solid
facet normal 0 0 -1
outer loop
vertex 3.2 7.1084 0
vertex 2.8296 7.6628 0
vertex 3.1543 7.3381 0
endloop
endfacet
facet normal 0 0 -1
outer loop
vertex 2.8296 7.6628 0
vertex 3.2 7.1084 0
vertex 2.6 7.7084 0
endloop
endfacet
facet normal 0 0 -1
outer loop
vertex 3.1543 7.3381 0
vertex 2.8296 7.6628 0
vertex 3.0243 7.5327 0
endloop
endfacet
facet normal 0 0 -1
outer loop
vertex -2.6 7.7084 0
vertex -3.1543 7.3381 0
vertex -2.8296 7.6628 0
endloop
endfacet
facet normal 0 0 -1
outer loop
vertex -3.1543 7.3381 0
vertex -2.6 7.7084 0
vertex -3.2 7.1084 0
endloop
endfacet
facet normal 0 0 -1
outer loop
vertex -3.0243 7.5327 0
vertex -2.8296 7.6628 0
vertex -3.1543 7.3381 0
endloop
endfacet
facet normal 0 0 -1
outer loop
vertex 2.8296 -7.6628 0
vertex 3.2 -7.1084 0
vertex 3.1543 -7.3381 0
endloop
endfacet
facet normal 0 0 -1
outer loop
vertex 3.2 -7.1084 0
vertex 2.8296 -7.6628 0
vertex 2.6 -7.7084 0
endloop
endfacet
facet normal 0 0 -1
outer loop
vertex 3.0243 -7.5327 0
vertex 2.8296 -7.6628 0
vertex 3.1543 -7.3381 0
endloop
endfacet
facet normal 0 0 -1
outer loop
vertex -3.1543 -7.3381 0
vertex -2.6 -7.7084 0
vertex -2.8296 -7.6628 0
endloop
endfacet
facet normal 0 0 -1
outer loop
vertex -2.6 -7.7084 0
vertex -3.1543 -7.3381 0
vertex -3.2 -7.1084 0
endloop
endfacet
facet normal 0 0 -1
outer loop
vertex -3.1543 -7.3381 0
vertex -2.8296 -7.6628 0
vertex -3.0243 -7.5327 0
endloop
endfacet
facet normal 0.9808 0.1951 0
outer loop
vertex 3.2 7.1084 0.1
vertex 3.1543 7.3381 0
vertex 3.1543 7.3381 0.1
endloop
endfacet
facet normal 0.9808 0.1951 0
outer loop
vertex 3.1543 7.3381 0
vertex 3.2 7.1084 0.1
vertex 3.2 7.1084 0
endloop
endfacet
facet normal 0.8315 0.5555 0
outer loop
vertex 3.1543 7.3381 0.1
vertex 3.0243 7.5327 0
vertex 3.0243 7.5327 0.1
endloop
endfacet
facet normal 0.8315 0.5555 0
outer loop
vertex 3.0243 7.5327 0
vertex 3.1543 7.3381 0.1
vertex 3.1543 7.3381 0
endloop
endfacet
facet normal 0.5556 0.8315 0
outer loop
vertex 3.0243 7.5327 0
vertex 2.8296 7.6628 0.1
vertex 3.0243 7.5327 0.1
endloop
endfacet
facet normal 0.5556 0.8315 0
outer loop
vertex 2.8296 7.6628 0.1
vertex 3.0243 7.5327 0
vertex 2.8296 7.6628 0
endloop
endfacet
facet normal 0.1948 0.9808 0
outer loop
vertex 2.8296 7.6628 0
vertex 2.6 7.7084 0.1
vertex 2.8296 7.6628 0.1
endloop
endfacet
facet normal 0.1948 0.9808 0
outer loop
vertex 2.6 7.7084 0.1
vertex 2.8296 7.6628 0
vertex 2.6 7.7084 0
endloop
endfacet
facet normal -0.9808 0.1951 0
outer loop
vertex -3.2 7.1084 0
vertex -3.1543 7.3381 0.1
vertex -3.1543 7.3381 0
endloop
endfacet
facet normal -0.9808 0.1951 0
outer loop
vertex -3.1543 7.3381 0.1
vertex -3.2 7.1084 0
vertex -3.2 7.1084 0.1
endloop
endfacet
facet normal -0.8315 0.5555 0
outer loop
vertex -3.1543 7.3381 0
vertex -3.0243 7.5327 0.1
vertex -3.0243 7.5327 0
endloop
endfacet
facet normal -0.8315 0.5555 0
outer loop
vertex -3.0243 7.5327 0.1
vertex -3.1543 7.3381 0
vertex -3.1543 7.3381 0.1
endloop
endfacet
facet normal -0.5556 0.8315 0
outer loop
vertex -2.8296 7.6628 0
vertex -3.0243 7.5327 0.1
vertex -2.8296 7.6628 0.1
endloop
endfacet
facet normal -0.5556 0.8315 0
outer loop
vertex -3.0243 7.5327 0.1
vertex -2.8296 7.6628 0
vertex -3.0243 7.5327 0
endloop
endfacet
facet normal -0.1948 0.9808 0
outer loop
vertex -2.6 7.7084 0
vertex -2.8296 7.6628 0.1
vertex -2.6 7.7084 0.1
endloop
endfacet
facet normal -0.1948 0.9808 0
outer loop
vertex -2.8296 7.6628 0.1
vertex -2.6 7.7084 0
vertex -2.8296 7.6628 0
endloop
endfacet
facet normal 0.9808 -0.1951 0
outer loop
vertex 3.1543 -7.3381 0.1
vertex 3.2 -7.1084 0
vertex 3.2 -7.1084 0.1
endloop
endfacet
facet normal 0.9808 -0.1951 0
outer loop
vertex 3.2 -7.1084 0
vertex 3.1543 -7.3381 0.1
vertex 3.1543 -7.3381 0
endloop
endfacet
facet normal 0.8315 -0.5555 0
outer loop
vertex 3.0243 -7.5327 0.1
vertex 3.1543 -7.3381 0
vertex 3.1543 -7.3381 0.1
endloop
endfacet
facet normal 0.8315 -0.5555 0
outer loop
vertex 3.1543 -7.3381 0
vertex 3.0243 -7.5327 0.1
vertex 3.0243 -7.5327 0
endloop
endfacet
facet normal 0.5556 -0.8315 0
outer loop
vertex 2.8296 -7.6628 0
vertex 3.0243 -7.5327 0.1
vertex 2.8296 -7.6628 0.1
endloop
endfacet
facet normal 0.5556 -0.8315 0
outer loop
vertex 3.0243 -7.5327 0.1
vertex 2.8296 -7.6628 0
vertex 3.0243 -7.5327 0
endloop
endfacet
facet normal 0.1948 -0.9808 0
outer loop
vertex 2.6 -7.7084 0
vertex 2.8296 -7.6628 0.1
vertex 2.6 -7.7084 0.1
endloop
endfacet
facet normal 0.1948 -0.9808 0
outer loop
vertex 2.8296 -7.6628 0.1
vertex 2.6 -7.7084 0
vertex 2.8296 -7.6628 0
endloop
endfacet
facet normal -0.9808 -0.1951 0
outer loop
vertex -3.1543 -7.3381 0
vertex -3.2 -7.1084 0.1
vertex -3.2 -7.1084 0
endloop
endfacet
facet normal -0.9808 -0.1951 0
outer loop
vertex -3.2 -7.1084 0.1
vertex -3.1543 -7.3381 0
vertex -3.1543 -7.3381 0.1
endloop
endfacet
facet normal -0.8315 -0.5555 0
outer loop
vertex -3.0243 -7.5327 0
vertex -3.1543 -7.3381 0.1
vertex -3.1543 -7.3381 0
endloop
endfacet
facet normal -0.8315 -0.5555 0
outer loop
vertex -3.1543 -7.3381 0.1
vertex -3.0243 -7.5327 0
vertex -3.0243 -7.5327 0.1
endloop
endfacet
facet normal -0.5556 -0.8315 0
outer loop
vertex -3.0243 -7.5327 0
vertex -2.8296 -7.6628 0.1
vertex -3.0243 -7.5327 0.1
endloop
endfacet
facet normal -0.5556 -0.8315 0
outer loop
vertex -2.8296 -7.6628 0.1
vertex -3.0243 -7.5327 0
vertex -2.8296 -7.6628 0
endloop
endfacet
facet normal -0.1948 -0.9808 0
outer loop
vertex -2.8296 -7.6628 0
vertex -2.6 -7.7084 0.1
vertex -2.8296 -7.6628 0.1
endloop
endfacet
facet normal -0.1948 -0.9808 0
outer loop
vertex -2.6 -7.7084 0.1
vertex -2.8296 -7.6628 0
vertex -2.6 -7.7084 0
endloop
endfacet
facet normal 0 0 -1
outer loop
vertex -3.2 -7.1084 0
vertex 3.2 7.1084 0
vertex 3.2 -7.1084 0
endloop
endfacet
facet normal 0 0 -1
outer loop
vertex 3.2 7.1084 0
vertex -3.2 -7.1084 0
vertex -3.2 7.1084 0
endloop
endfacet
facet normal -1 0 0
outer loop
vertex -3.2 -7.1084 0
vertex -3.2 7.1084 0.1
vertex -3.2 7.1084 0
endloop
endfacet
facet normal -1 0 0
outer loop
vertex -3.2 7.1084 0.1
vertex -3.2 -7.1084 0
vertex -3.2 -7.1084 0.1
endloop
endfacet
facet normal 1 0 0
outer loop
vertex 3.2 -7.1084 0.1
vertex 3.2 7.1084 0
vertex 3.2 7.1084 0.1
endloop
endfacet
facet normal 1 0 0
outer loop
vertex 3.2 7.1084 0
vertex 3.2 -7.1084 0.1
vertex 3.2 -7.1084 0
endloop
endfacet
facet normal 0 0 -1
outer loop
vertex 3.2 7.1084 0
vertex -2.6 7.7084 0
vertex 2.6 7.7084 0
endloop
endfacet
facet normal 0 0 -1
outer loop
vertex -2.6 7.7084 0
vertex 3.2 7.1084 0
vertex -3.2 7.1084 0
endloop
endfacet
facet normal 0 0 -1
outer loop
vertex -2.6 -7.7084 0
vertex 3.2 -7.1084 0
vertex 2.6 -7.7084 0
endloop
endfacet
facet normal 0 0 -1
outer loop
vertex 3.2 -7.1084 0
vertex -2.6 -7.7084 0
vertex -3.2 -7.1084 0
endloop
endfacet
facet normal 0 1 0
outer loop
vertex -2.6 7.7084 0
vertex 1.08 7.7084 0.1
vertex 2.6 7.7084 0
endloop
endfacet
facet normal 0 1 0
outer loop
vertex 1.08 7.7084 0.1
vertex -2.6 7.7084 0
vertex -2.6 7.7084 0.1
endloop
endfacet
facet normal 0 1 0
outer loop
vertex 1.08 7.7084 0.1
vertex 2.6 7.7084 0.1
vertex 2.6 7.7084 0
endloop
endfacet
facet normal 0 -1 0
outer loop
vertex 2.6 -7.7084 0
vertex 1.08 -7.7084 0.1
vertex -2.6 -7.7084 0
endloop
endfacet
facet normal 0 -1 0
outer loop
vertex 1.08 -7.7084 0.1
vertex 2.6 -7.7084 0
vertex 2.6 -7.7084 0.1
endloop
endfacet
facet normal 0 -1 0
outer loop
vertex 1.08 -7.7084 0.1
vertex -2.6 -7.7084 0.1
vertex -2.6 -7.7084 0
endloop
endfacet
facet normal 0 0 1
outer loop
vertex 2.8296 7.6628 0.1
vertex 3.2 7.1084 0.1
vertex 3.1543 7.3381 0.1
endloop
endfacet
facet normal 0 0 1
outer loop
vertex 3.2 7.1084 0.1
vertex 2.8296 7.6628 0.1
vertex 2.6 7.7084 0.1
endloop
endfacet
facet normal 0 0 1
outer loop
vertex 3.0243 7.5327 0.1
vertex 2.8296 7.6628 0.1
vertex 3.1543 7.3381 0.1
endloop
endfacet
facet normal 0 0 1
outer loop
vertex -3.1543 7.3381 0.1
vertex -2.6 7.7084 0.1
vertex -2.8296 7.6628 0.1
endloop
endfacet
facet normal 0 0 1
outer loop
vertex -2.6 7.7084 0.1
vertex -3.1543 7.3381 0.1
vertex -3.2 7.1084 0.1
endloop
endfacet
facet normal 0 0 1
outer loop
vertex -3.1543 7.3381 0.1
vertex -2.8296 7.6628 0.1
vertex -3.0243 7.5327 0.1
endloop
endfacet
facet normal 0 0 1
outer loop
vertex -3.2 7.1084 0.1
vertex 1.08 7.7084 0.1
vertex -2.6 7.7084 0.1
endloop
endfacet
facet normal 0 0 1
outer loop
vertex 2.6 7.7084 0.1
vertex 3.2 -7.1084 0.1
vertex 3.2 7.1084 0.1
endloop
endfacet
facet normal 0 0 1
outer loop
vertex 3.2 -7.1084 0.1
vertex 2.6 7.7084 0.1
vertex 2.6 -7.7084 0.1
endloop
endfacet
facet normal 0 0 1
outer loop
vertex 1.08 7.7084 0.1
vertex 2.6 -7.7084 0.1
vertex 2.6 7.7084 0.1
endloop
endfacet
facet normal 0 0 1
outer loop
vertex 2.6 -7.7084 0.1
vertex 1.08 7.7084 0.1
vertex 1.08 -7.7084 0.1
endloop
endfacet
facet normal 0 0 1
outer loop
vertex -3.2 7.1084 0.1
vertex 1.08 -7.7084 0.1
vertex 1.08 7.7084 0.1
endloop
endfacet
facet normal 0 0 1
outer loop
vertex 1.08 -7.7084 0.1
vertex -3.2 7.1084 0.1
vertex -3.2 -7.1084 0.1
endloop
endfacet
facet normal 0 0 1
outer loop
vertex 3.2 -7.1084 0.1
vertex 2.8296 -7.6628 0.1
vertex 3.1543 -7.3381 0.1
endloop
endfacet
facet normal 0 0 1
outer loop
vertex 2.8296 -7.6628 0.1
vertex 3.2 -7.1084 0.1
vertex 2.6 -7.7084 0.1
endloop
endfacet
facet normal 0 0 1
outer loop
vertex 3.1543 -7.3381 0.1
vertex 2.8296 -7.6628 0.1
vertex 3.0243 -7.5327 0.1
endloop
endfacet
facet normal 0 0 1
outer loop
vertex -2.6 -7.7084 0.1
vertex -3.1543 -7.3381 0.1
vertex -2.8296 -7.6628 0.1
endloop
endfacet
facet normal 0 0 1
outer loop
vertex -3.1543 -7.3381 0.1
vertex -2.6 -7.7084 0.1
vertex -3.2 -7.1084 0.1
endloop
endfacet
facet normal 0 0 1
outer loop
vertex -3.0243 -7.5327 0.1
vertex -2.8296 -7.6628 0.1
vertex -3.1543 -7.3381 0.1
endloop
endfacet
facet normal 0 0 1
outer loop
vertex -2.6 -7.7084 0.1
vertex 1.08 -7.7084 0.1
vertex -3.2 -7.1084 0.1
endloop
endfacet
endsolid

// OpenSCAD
// file: ../p/box3u12.scad
use <../lib.scad>
function ldraw_lib__box3u12() = [
// 0 Box with 3 Parallel Faces without Any Edges
// 0 Name: box3u12.dat
// 0 Author: J.C. Tchang [tchang]
// 0 !LDRAW_ORG Primitive UPDATE 2014-02
// 0 !LICENSE Licensed under CC BY 4.0 : see CAreadme.txt
// 
// 0 BFC CERTIFY CCW
  [0,"BFC","CERTIFY"],
  [0,"BFC","CCW"],
// 
// 0 !HISTORY 2014-12-23 [PTadmin] Official Update 2014-02
// 
// 
// 4 16 -1 1 1 1 1 1 1 1 -1 -1 1 -1
  [4,16,-1,1,1,1,1,1,1,1,-1,-1,1,-1],
// 4 16 -1 1 1 -1 0 1 1 0 1 1 1 1
  [4,16,-1,1,1,-1,0,1,1,0,1,1,1,1],
// 4 16 1 1 -1 1 0 -1 -1 0 -1 -1 1 -1
  [4,16,1,1,-1,1,0,-1,-1,0,-1,-1,1,-1],
];
module ldraw_lib__box3u12(step=0, col=false, unit=2/5, alt=false, line=0.2, solid=!$preview)
    makepoly(ldraw_lib__box3u12(), step=step, col=col, unit=unit, alt=alt, line=line, solid=solid);
ldraw_lib__box3u12(line=0.2);
// file: ../p/1-4cyli.scad
use <../lib.scad>
function ldraw_lib__1_4cyli() = [
// 0 Cylinder 0.25
// 0 Name: 1-4cyli.dat
// 0 Author: James Jessiman
// 0 !LDRAW_ORG Primitive UPDATE 2012-01
// 0 !LICENSE Licensed under CC BY 4.0 : see CAreadme.txt
// 
// 0 BFC CERTIFY CCW
  [0,"BFC","CERTIFY"],
  [0,"BFC","CCW"],
// 
// 0 !HISTORY 2002-03-23 [sbliss] Added BFC statement.
// 0 !HISTORY 2002-04-25 [PTadmin] Official Update 2002-02
// 0 !HISTORY 2007-06-22 [PTadmin] Header formatted for Contributor Agreement
// 0 !HISTORY 2008-07-01 [PTadmin] Official Update 2008-01
// 0 !HISTORY 2012-02-16 [Philo] Changed to CCW
// 0 !HISTORY 2012-03-30 [PTadmin] Official Update 2012-01
// 
// 
// 4 16 1 1 0 0.9239 1 0.3827 0.9239 0 0.3827 1 0 0
  [4,16,1,1,0,0.9239,1,0.3827,0.9239,0,0.3827,1,0,0],
// 5 24 1 0 0 1 1 0 0.9239 0 0.3827 1 0 -1
  [5,24,1,0,0,1,1,0,0.9239,0,0.3827,1,0,-1],
// 4 16 0.9239 1 0.3827 0.7071 1 0.7071 0.7071 0 0.7071 0.9239 0 0.3827
  [4,16,0.9239,1,0.3827,0.7071,1,0.7071,0.7071,0,0.7071,0.9239,0,0.3827],
// 5 24 0.9239 0 0.3827 0.9239 1 0.3827 0.7071 0 0.7071 1 0 0
  [5,24,0.9239,0,0.3827,0.9239,1,0.3827,0.7071,0,0.7071,1,0,0],
// 4 16 0.7071 1 0.7071 0.3827 1 0.9239 0.3827 0 0.9239 0.7071 0 0.7071
  [4,16,0.7071,1,0.7071,0.3827,1,0.9239,0.3827,0,0.9239,0.7071,0,0.7071],
// 5 24 0.7071 0 0.7071 0.7071 1 0.7071 0.3827 0 0.9239 0.9239 0 0.3827
  [5,24,0.7071,0,0.7071,0.7071,1,0.7071,0.3827,0,0.9239,0.9239,0,0.3827],
// 4 16 0.3827 1 0.9239 0 1 1 0 0 1 0.3827 0 0.9239
  [4,16,0.3827,1,0.9239,0,1,1,0,0,1,0.3827,0,0.9239],
// 5 24 0.3827 0 0.9239 0.3827 1 0.9239 0 0 1 0.7071 0 0.7071
  [5,24,0.3827,0,0.9239,0.3827,1,0.9239,0,0,1,0.7071,0,0.7071],
// 5 24 0 0 1 0 1 1 0.3827 0 0.9239 -1 0 1
  [5,24,0,0,1,0,1,1,0.3827,0,0.9239,-1,0,1],
];
module ldraw_lib__1_4cyli(step=0, col=false, unit=2/5, alt=false, line=0.2, solid=!$preview)
    makepoly(ldraw_lib__1_4cyli(), step=step, col=col, unit=unit, alt=alt, line=line, solid=solid);
ldraw_lib__1_4cyli(line=0.2);
// file: ../p/1-4chrd.scad
use <../lib.scad>
function ldraw_lib__1_4chrd() = [
// 0 Chord 0.25
// 0 Name: 1-4chrd.dat
// 0 Author: Max Martin Richter [MMR1988]
// 0 !LDRAW_ORG Primitive UPDATE 2023-05
// 0 !LICENSE Licensed under CC BY 4.0 : see CAreadme.txt
// 
// 0 BFC CERTIFY CCW
  [0,"BFC","CERTIFY"],
  [0,"BFC","CCW"],
// 
// 0 !HISTORY 2004-04-22 [PTadmin] Official Update 2004-02
// 0 !HISTORY 2007-10-09 [PTadmin] Header formatted for Contributor Agreement
// 0 !HISTORY 2008-07-01 [PTadmin] Official Update 2008-01
// 0 !HISTORY 2012-08-02 [MMR1988] Re-creation with PrimGen2 and Rectifier
// 0 !HISTORY 2012-08-09 [PTadmin] Official Update 2012-02
// 0 !HISTORY 2023-10-27 [OrionP] Change author to MMR1988 from hafhead
// 0 !HISTORY 2023-10-31 [OrionP] Official Update 2023-05
// 
// 4 16 0.9239 0 0.3827 0.3827 0 0.9239 0 0 1 1 0 0
  [4,16,0.9239,0,0.3827,0.3827,0,0.9239,0,0,1,1,0,0],
// 3 16 0.7071 0 0.7071 0.3827 0 0.9239 0.9239 0 0.3827
  [3,16,0.7071,0,0.7071,0.3827,0,0.9239,0.9239,0,0.3827],
];
module ldraw_lib__1_4chrd(step=0, col=false, unit=2/5, alt=false, line=0.2, solid=!$preview)
    makepoly(ldraw_lib__1_4chrd(), step=step, col=col, unit=unit, alt=alt, line=line, solid=solid);
ldraw_lib__1_4chrd(line=0.2);
// file: 6451314b.scad
use <../lib.scad>
use <../p/1-4chrd.scad>
use <../p/1-4cyli.scad>
use <../p/box3u12.scad>
function ldraw_lib__6451314b() = [
// 0 Sticker  1.9 x  0.8 with Metallic Silver Left Stripe on Red Background
// 0 Name: 6451314b.dat
// 0 Author: Vincent Messenet [Cheenzo]
// 0 !LDRAW_ORG Part UPDATE 2024-01
// 0 !LICENSE Licensed under CC BY 4.0 : see CAreadme.txt
// 
// 0 BFC CERTIFY CCW
  [0,"BFC","CERTIFY"],
  [0,"BFC","CCW"],
// 
// 0 !KEYWORDS Bricklink 10321stk01, Brickowl 1314396, Chevrolet, Corvette, Icons
// 0 !KEYWORDS Rebrickable 10104784, Set 10321
// 
// 0 !HISTORY 2024-01-29 [OrionP] Official Update 2024-01
// 
// 1 16 -6.5 0 17.7711 -1.5 0 0 0 -1 0 0 0 1.5 1-4chrd.dat
  [1,16,-6.5,0,17.7711,-1.5,0,0,0,-1,0,0,0,1.5, ldraw_lib__1_4chrd()],
// 1 16 6.5 0 17.7711 1.5 0 0 0 -1 0 0 0 1.5 1-4chrd.dat
  [1,16,6.5,0,17.7711,1.5,0,0,0,-1,0,0,0,1.5, ldraw_lib__1_4chrd()],
// 1 16 -6.5 0 -17.7711 -1.5 0 0 0 -1 0 0 0 -1.5 1-4chrd.dat
  [1,16,-6.5,0,-17.7711,-1.5,0,0,0,-1,0,0,0,-1.5, ldraw_lib__1_4chrd()],
// 1 16 6.5 0 -17.7711 1.5 0 0 0 -1 0 0 0 -1.5 1-4chrd.dat
  [1,16,6.5,0,-17.7711,1.5,0,0,0,-1,0,0,0,-1.5, ldraw_lib__1_4chrd()],
// 1 16 -6.5 -.25 17.7711 -1.5 0 0 0 .25 0 0 0 1.5 1-4cyli.dat
  [1,16,-6.5,-.25,17.7711,-1.5,0,0,0,.25,0,0,0,1.5, ldraw_lib__1_4cyli()],
// 1 16 6.5 -.25 17.7711 1.5 0 0 0 .25 0 0 0 1.5 1-4cyli.dat
  [1,16,6.5,-.25,17.7711,1.5,0,0,0,.25,0,0,0,1.5, ldraw_lib__1_4cyli()],
// 1 16 -6.5 -.25 -17.7711 -1.5 0 0 0 .25 0 0 0 -1.5 1-4cyli.dat
  [1,16,-6.5,-.25,-17.7711,-1.5,0,0,0,.25,0,0,0,-1.5, ldraw_lib__1_4cyli()],
// 1 16 6.5 -.25 -17.7711 1.5 0 0 0 .25 0 0 0 -1.5 1-4cyli.dat
  [1,16,6.5,-.25,-17.7711,1.5,0,0,0,.25,0,0,0,-1.5, ldraw_lib__1_4cyli()],
// 1 16 0 -.25 0 0 0 8 0 .25 0 17.7711 0 0 box3u12.dat
  [1,16,0,-.25,0,0,0,8,0,.25,0,17.7711,0,0, ldraw_lib__box3u12()],
// 4 16 6.5 0 19.2711 8 0 17.7711 -8 0 17.7711 -6.5 0 19.2711
  [4,16,6.5,0,19.2711,8,0,17.7711,-8,0,17.7711,-6.5,0,19.2711],
// 4 16 8 0 -17.7711 6.5 0 -19.2711 -6.5 0 -19.2711 -8 0 -17.7711
  [4,16,8,0,-17.7711,6.5,0,-19.2711,-6.5,0,-19.2711,-8,0,-17.7711],
// 4 16 -2.7 -.25 19.2711 6.5 -.25 19.2711 6.5 0 19.2711 -6.5 0 19.2711
  [4,16,-2.7,-.25,19.2711,6.5,-.25,19.2711,6.5,0,19.2711,-6.5,0,19.2711],
// 3 16 -6.5 0 19.2711 -6.5 -.25 19.2711 -2.7 -.25 19.2711
  [3,16,-6.5,0,19.2711,-6.5,-.25,19.2711,-2.7,-.25,19.2711],
// 4 16 -6.5 0 -19.2711 6.5 0 -19.2711 -2.7 -.25 -19.2711 -6.5 -.25 -19.2711
  [4,16,-6.5,0,-19.2711,6.5,0,-19.2711,-2.7,-.25,-19.2711,-6.5,-.25,-19.2711],
// 3 16 6.5 0 -19.2711 6.5 -.25 -19.2711 -2.7 -.25 -19.2711
  [3,16,6.5,0,-19.2711,6.5,-.25,-19.2711,-2.7,-.25,-19.2711],
// 1 4 -6.5 -.25 17.7711 -1.5 0 0 0 1 0 0 0 1.5 1-4chrd.dat
  [1,4,-6.5,-.25,17.7711,-1.5,0,0,0,1,0,0,0,1.5, ldraw_lib__1_4chrd()],
// 1 4 6.5 -.25 17.7711 1.5 0 0 0 1 0 0 0 1.5 1-4chrd.dat
  [1,4,6.5,-.25,17.7711,1.5,0,0,0,1,0,0,0,1.5, ldraw_lib__1_4chrd()],
// 3 4 6.5 -.25 19.2711 -2.7 -.25 19.2711 8 -.25 17.7711
  [3,4,6.5,-.25,19.2711,-2.7,-.25,19.2711,8,-.25,17.7711],
// 4 4 -6.5 -.25 -19.2711 -6.5 -.25 19.2711 -8 -.25 17.7711 -8 -.25 -17.7711
  [4,4,-6.5,-.25,-19.2711,-6.5,-.25,19.2711,-8,-.25,17.7711,-8,-.25,-17.7711],
// 4 80 -6.5 -.25 19.2711 -6.5 -.25 -19.2711 -2.7 -.25 -19.2711 -2.7 -.25 19.2711
  [4,80,-6.5,-.25,19.2711,-6.5,-.25,-19.2711,-2.7,-.25,-19.2711,-2.7,-.25,19.2711],
// 4 4 8 -.25 17.7711 -2.7 -.25 19.2711 -2.7 -.25 -19.2711 8 -.25 -17.7711
  [4,4,8,-.25,17.7711,-2.7,-.25,19.2711,-2.7,-.25,-19.2711,8,-.25,-17.7711],
// 1 4 -6.5 -.25 -17.7711 -1.5 0 0 0 1 0 0 0 -1.5 1-4chrd.dat
  [1,4,-6.5,-.25,-17.7711,-1.5,0,0,0,1,0,0,0,-1.5, ldraw_lib__1_4chrd()],
// 1 4 6.5 -.25 -17.7711 1.5 0 0 0 1 0 0 0 -1.5 1-4chrd.dat
  [1,4,6.5,-.25,-17.7711,1.5,0,0,0,1,0,0,0,-1.5, ldraw_lib__1_4chrd()],
// 3 4 8 -.25 -17.7711 -2.7 -.25 -19.2711 6.5 -.25 -19.2711
  [3,4,8,-.25,-17.7711,-2.7,-.25,-19.2711,6.5,-.25,-19.2711],
];
module ldraw_lib__6451314b(step=0, col=false, unit=2/5, alt=false, line=0.2, solid=!$preview)
    makepoly(ldraw_lib__6451314b(), step=step, col=col, unit=unit, alt=alt, line=line, solid=solid);
ldraw_lib__6451314b(line=0.2);
// main file
use <../lib.scad>
use <6451314b.scad>
function ldraw_lib__6451314d() = [
// 0 Sticker  1.9 x  0.8 with Metallic Silver Right Stripe on Red Background
// 0 Name: 6451314d.dat
// 0 Author: Vincent Messenet [Cheenzo]
// 0 !LDRAW_ORG Part UPDATE 2024-01
// 0 !LICENSE Licensed under CC BY 4.0 : see CAreadme.txt
// 
// 0 BFC CERTIFY CCW
  [0,"BFC","CERTIFY"],
  [0,"BFC","CCW"],
// 
// 0 !KEYWORDS Bricklink 10321stk01, Brickowl 1314396, Chevrolet, Corvette, Icons
// 0 !KEYWORDS Rebrickable 10104784, Set 10321
// 
// 0 !HISTORY 2024-01-29 [OrionP] Official Update 2024-01
// 
// 1 16 0 0 0 -1 0 0 0 1 0 0 0 1 6451314b.dat
  [1,16,0,0,0,-1,0,0,0,1,0,0,0,1, ldraw_lib__6451314b()],
];
module ldraw_lib__6451314d(step=0, col=false, unit=2/5, alt=false, line=0.2, solid=!$preview)
    makepoly(ldraw_lib__6451314d(), step=step, col=col, unit=unit, alt=alt, line=line, solid=solid);
ldraw_lib__6451314d(line=0.2);
